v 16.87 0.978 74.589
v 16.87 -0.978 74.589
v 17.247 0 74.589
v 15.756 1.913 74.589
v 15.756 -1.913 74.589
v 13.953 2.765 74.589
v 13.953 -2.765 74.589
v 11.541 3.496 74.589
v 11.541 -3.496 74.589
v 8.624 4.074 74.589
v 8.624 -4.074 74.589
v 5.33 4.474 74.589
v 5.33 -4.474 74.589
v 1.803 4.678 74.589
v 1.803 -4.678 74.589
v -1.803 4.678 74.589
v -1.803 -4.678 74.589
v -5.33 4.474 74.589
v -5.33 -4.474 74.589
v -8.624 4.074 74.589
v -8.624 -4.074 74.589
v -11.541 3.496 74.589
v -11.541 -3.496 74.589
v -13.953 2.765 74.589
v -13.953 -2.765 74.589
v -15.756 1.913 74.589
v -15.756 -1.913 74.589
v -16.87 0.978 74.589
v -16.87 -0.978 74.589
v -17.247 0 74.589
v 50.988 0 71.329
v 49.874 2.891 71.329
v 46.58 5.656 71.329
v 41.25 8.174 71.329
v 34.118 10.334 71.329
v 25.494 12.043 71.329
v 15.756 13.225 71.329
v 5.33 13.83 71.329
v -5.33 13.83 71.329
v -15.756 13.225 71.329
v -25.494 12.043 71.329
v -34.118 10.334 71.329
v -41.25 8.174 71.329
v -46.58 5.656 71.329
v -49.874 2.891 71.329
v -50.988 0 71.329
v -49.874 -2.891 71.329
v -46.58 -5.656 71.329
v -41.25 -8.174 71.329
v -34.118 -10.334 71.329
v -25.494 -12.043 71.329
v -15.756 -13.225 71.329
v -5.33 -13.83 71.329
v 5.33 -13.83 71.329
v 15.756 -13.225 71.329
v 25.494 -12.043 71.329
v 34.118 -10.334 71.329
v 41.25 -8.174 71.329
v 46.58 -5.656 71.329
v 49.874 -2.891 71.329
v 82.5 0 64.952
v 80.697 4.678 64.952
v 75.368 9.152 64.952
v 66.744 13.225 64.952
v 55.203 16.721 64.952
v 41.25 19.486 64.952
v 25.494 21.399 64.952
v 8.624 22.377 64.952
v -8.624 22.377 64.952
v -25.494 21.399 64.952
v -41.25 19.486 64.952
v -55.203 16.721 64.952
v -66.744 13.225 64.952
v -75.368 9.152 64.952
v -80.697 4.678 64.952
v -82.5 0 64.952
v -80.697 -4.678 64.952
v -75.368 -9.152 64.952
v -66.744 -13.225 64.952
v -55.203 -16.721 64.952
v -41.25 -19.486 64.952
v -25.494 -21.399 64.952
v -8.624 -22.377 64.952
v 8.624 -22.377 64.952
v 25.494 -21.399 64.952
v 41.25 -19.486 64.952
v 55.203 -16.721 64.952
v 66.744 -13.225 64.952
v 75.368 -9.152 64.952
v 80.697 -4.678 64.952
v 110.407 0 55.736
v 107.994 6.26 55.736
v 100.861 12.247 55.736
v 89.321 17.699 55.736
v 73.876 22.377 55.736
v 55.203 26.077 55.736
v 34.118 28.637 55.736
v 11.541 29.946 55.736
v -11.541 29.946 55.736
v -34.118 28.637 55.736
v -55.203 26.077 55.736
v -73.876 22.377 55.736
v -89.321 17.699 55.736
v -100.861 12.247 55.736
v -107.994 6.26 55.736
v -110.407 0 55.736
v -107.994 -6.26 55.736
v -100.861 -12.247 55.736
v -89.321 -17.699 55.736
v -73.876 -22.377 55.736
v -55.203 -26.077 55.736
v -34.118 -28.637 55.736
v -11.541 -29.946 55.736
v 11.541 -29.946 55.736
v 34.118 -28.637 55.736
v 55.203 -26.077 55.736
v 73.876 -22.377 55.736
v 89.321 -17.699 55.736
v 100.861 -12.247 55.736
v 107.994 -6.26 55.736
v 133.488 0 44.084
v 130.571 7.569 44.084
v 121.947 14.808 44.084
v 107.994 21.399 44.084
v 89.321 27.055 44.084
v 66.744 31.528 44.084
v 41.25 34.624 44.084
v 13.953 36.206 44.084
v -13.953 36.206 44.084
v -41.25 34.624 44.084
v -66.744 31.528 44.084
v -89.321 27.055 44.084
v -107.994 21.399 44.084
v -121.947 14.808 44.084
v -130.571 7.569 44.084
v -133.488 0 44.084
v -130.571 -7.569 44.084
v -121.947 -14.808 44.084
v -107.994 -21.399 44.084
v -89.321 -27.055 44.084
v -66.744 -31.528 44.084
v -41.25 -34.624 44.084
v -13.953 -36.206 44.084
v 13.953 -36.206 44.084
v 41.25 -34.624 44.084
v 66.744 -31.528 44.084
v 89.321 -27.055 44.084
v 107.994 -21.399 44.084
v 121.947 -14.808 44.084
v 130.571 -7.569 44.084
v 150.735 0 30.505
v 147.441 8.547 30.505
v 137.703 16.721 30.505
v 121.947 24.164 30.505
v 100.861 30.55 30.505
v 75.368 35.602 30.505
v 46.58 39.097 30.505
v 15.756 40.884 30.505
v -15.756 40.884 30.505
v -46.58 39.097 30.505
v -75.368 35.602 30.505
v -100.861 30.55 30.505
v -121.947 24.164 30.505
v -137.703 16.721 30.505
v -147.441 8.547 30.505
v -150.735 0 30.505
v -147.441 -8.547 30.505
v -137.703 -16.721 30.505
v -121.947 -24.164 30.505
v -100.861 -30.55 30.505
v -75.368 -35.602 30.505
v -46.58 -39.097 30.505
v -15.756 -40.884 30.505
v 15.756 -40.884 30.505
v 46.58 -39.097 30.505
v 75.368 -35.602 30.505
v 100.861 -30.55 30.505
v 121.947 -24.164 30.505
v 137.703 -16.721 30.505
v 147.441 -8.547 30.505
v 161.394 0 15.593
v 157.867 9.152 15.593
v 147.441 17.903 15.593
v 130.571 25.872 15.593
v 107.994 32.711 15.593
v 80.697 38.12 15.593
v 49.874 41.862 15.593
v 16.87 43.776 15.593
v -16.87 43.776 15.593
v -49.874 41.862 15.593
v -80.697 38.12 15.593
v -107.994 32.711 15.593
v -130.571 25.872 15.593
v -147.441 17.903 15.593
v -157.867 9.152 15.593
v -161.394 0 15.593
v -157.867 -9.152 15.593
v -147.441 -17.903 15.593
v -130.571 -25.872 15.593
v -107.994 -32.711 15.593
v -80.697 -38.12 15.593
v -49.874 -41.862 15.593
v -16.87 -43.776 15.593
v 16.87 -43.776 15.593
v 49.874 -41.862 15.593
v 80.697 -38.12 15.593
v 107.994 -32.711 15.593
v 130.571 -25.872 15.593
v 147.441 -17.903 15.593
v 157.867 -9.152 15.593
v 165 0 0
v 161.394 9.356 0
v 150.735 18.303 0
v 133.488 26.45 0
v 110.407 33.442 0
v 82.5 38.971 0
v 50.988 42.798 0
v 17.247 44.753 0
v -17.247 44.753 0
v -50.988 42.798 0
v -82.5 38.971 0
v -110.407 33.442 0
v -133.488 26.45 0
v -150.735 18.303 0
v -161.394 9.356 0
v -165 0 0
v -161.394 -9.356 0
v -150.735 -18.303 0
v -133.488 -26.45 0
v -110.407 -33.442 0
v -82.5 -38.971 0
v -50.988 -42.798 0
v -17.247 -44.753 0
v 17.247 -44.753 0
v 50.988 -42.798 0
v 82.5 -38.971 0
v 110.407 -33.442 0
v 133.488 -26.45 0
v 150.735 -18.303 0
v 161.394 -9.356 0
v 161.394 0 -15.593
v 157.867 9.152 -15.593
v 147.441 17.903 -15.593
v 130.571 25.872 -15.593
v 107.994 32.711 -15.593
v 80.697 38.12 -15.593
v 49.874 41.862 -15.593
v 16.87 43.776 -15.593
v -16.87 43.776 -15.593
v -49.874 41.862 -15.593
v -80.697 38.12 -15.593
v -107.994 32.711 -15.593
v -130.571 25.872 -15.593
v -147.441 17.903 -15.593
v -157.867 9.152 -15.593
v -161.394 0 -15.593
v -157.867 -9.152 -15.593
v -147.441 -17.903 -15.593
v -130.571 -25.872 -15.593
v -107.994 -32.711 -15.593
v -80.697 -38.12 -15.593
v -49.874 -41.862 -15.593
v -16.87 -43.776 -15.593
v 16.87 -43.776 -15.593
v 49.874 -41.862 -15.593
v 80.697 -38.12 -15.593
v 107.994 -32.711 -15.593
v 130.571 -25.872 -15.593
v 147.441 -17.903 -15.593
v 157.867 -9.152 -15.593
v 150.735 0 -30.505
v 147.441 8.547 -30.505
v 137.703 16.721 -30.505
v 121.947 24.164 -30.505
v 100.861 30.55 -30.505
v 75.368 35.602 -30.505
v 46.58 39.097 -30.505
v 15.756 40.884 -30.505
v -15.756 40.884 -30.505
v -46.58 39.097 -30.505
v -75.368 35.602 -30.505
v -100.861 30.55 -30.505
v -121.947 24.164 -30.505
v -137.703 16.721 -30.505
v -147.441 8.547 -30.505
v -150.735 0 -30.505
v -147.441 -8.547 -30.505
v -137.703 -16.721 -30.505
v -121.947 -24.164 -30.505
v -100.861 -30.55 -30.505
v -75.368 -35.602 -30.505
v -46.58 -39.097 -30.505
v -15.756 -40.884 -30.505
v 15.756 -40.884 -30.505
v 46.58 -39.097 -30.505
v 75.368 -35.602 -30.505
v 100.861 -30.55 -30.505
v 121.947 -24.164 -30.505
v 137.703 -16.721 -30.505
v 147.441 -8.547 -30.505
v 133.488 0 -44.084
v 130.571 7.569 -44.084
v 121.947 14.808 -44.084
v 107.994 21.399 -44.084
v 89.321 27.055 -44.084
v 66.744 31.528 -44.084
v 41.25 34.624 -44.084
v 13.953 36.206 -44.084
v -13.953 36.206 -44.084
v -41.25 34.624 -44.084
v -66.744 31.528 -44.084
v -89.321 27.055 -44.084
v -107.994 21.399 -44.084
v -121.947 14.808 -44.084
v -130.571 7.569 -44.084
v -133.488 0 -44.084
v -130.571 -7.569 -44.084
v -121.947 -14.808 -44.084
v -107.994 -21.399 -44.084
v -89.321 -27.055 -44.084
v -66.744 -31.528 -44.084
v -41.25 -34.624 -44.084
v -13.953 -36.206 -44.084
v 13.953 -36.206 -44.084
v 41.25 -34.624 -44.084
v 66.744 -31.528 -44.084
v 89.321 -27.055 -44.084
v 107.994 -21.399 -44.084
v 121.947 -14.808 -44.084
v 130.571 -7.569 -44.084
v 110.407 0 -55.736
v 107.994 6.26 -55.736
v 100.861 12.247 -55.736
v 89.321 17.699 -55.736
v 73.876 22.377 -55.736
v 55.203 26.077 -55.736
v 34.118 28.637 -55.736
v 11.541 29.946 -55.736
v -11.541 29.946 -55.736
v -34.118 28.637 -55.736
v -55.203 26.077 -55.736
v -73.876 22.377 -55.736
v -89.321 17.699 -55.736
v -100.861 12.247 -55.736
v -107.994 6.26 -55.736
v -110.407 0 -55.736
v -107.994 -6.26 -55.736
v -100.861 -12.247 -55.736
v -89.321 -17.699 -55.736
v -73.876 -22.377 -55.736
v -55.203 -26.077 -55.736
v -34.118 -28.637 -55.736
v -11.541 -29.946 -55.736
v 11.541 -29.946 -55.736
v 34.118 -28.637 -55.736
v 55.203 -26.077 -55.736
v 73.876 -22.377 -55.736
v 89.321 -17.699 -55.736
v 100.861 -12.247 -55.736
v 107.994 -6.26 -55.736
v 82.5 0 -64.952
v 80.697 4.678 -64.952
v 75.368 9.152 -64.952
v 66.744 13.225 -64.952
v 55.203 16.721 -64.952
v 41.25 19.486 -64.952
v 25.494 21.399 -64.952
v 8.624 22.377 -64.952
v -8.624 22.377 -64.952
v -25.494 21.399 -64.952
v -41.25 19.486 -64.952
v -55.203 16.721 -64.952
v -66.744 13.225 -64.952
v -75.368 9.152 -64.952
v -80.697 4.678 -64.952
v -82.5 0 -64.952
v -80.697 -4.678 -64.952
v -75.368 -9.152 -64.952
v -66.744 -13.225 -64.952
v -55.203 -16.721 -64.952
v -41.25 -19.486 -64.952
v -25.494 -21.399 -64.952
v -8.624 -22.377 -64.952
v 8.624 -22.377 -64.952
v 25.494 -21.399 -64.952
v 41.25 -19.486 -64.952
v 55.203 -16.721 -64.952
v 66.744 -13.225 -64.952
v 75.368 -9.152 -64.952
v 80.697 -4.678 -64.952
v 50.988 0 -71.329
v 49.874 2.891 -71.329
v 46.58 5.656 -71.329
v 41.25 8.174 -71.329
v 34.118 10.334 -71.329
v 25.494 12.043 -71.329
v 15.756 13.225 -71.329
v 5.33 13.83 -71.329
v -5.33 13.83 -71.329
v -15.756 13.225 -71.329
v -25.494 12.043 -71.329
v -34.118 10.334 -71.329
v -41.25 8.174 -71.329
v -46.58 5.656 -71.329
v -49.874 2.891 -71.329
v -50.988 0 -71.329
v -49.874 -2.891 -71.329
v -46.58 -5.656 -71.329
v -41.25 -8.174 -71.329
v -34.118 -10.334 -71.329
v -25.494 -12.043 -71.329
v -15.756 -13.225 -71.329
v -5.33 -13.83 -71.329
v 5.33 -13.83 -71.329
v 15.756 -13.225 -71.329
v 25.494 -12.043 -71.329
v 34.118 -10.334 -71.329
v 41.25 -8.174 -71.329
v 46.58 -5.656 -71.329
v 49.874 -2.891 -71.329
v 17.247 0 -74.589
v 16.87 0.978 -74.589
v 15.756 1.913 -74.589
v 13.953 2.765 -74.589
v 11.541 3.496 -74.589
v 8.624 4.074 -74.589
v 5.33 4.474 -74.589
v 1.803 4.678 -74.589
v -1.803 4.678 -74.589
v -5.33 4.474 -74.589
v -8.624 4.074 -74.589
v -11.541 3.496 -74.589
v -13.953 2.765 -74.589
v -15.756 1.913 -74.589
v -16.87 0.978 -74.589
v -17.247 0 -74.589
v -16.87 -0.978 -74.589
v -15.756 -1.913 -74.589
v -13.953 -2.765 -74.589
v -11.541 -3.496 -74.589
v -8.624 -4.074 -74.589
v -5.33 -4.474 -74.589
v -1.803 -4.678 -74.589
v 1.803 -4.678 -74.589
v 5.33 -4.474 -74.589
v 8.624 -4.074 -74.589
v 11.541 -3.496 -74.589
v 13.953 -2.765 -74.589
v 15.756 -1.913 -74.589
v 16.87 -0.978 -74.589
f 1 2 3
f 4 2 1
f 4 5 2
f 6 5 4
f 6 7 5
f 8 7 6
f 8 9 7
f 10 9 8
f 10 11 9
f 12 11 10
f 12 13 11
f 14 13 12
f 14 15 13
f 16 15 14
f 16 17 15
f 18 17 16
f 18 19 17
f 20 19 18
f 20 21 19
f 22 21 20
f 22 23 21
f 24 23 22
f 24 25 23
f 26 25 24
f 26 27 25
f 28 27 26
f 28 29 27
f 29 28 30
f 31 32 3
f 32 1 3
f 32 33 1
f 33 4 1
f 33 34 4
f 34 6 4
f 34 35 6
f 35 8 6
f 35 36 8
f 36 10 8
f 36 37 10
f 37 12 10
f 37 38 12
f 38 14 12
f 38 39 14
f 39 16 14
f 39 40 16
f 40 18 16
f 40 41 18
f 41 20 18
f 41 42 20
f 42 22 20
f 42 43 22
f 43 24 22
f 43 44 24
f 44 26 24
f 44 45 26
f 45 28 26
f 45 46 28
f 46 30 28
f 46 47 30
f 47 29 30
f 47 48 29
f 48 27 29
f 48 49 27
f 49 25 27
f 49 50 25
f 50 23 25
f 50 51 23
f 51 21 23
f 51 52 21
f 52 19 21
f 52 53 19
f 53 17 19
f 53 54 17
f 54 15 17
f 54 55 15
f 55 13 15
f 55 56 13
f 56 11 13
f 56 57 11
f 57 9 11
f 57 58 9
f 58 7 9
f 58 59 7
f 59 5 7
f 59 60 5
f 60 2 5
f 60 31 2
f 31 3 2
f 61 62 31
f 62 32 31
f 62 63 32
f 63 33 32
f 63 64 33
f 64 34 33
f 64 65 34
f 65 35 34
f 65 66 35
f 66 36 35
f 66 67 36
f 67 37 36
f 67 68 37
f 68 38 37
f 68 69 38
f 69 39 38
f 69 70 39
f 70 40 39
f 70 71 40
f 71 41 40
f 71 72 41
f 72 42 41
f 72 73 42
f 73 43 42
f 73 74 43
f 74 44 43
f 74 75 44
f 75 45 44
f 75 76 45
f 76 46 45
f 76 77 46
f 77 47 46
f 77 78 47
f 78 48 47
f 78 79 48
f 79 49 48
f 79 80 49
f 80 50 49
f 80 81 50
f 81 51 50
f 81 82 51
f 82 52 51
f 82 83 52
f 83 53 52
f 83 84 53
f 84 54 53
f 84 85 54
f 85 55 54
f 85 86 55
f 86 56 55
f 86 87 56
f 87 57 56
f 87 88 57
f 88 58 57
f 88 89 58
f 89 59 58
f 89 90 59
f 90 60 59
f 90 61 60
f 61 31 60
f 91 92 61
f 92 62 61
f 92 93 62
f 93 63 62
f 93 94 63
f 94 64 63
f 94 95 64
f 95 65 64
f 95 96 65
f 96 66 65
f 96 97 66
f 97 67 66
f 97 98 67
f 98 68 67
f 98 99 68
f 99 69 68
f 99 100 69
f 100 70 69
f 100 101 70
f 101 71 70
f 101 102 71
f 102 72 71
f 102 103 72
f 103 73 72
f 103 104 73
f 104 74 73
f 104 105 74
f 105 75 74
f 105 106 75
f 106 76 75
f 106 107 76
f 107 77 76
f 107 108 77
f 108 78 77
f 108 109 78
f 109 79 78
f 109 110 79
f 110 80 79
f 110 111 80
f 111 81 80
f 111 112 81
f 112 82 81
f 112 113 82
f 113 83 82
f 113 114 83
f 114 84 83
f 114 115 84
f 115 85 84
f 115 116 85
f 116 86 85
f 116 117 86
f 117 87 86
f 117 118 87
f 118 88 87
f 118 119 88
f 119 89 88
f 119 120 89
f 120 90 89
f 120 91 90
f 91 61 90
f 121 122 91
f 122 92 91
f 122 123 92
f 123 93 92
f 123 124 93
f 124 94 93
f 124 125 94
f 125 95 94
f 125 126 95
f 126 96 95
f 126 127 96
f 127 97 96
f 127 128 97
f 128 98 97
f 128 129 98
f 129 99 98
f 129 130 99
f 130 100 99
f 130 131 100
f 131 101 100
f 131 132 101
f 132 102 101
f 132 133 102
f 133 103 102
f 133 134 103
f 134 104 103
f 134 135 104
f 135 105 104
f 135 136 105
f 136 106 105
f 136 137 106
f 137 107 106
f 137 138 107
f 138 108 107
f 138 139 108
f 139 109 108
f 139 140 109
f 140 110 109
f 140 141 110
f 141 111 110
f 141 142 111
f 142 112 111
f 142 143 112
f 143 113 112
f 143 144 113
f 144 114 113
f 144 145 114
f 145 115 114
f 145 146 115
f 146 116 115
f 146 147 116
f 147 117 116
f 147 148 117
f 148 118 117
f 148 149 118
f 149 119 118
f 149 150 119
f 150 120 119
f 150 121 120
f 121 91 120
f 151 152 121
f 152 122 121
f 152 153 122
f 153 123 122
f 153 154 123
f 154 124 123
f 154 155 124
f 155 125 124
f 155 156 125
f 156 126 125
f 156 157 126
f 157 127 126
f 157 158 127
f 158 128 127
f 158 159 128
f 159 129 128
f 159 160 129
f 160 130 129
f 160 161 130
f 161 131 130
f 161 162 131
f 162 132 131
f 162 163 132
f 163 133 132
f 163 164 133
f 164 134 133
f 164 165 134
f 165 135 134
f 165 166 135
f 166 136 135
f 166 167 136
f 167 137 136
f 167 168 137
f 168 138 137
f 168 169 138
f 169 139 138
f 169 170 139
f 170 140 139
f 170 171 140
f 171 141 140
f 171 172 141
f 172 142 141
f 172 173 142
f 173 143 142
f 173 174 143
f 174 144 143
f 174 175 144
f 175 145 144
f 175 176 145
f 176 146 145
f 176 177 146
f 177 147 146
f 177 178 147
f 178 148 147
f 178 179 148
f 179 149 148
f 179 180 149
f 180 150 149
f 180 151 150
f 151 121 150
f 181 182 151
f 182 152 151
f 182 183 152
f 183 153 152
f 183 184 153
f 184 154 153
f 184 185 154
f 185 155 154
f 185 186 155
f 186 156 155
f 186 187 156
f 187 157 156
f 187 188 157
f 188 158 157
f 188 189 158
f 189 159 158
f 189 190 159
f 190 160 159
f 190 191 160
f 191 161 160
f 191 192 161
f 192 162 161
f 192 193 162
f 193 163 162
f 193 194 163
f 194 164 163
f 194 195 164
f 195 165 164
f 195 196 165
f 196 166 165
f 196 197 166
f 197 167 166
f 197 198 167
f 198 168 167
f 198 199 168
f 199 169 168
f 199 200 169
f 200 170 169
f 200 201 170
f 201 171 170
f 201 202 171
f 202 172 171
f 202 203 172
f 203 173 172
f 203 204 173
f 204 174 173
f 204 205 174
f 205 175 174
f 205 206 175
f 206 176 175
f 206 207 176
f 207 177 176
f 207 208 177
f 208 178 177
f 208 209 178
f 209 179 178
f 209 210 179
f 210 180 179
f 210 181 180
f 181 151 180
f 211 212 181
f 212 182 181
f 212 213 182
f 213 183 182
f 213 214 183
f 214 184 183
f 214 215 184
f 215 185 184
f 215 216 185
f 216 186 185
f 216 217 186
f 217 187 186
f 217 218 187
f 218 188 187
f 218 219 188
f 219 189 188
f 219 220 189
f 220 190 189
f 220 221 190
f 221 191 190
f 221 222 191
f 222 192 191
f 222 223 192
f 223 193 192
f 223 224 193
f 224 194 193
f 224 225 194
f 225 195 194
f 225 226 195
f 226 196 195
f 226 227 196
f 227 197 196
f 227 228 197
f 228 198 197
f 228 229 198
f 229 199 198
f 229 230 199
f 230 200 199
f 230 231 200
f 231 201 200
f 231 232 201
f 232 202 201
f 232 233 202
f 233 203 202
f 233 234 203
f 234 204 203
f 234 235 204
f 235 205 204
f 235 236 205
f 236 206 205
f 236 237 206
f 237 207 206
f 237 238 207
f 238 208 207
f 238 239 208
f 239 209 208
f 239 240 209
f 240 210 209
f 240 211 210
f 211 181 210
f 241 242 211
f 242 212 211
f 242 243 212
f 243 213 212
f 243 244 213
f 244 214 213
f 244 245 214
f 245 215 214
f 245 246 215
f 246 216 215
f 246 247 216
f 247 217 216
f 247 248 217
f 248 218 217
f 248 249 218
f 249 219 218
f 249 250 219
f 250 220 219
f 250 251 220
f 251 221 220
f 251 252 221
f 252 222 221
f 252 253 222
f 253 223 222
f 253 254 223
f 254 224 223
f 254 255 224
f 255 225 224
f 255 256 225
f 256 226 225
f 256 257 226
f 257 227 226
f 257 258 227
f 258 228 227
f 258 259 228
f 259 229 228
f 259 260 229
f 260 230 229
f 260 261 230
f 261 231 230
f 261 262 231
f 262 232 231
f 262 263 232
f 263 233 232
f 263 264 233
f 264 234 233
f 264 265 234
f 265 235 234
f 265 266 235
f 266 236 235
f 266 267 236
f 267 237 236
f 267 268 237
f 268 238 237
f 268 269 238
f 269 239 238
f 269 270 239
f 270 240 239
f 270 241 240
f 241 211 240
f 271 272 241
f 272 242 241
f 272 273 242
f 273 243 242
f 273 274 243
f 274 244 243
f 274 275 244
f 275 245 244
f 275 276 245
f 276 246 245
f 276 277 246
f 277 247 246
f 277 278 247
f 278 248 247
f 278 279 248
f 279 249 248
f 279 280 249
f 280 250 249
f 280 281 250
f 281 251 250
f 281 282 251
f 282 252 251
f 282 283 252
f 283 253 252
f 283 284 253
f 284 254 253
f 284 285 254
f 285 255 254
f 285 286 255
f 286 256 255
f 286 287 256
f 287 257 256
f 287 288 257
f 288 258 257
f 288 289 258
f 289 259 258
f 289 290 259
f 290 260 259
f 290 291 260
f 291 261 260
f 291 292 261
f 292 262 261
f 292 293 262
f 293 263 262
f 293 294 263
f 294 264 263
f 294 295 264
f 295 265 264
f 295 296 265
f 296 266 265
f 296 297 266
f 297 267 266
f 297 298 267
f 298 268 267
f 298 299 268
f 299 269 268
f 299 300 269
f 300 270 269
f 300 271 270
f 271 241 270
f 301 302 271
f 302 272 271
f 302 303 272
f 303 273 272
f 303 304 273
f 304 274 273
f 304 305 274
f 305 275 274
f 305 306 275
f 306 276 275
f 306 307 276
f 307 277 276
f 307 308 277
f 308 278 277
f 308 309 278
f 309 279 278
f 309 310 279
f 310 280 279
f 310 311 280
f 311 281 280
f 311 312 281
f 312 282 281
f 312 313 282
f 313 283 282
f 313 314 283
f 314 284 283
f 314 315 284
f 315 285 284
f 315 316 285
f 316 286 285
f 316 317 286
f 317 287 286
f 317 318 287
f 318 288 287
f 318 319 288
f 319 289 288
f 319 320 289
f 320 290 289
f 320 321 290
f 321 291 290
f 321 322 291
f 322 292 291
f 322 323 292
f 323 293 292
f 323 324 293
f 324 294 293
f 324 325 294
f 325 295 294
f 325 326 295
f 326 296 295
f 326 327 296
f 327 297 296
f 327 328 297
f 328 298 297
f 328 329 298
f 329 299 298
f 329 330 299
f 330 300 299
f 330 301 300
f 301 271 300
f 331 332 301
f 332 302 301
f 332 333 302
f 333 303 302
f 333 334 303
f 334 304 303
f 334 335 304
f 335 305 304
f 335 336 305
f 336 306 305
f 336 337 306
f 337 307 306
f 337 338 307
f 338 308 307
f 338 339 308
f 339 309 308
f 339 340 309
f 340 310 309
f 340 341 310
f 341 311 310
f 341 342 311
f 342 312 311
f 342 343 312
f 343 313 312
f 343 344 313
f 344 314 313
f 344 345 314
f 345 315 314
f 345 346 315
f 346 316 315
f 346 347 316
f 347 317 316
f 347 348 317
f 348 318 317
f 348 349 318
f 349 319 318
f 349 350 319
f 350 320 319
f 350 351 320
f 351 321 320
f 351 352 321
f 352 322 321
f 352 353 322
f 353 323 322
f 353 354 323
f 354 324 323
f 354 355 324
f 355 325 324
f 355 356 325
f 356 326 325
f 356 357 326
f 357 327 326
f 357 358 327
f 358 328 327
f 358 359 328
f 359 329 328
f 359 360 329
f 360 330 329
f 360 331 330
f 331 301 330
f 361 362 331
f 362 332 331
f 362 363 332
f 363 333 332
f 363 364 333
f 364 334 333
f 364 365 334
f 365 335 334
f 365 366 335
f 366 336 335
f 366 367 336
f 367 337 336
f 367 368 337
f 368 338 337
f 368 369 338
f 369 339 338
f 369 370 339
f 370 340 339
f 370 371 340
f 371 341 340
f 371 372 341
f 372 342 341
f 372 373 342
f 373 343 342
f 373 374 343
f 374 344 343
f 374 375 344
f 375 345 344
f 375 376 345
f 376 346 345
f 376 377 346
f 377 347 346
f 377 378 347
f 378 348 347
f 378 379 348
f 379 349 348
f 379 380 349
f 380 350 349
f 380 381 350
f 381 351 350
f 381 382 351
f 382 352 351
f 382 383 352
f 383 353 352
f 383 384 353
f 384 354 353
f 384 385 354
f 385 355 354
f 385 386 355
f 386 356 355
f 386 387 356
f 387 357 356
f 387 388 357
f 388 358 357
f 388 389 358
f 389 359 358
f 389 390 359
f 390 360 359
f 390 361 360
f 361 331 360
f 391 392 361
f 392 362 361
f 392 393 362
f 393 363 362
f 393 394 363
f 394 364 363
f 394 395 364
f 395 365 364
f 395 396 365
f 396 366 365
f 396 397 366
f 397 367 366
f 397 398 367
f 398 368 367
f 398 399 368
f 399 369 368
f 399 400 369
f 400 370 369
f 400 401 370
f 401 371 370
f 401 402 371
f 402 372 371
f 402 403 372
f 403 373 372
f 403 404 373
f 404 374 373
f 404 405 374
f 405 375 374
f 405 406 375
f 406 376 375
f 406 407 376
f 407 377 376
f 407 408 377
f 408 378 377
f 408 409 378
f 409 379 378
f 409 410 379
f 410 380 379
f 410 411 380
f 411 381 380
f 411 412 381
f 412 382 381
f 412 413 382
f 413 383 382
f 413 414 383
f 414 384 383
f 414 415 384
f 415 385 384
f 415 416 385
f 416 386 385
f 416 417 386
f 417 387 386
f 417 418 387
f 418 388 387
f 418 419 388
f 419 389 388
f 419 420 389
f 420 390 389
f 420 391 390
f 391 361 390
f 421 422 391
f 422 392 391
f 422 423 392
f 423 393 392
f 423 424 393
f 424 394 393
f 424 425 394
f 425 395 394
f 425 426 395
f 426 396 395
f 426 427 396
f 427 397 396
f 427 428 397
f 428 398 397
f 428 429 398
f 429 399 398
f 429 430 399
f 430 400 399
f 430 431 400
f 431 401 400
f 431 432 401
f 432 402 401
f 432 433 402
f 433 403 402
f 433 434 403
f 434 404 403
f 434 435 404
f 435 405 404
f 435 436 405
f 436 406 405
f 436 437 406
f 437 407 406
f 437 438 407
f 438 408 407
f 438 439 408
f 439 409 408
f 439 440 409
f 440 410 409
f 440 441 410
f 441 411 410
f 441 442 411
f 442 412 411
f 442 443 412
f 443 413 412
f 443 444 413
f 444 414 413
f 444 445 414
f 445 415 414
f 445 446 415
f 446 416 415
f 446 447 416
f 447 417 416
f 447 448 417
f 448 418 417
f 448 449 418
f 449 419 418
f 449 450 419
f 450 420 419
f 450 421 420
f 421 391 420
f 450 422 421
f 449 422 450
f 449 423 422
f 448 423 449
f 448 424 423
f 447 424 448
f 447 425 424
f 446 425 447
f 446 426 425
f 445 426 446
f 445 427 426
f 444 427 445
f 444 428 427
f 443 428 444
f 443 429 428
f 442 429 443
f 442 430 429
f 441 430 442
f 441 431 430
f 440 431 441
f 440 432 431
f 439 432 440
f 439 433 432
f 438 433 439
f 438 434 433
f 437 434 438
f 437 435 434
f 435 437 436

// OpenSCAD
// Generated by SolidPython 1.0.1 on 2020-07-29 00:46:49


scale(v = [11, 3, 5]) {
	sphere(r = 15);
}
/***********************************************
*********      SolidPython code:      **********
************************************************
 
# import packages: SolidPython
from solid import *
from solid.utils import *
from itertools import chain, combinations, permutations


class Resize:

    def __init__(self, scad_file):
        self.scad_file = scad_file
        #self.scad_file = import_scad(scad_file)
        # cone/cylinder param:
        self.r1 = 0
        self.r2 = 0
        self.h = 0
        # rectangular prism param:
        self.w = 0
        self.l = 0
        # ellipse param:
        self.r = 0

    # import OpenScad code (file name corresponds to shape)


    # classify shape + parameters
    def assign(self, param1, param2, param3):
        if self.scad_file == 'cone.scad':
            self.r1 = param1
            self.r2 = param2
            self.h = param3
        elif self.scad_file == 'cylinder.scad':
            self.r1 = param1
            self.r2 = param2
            self.h = param3
        elif self.scad_file == 'rectangularPrism.scad':
            self.h = param1
            self.l = param2
            self.w = param3
        else:
            self.r = param1
            self.h = param2

    # resize parameters
    def iterate(self):
        x = range(3, 20, 2)
        i = 1
        if self.scad_file == 'cone.scad':
            tempList = list(permutations(x, 2))
            for temp in tempList:
                param1 = temp[0]
                param2 = temp[1]
                filepath = 'produced_scad_files/' + 'cone' + str(param1) + '_' + str(param2) + '_' + '.scad'
                scad_render_to_file(cylinder(h=param1, r1=param2, r2=0), filepath)

        elif self.scad_file == 'cylinder.scad':
            tempList = list(permutations(x, 3))
            for temp in tempList:
                param1 = temp[0]
                param2 = temp[1]
                filepath = 'produced_scad_files/' + 'cylinder' + str(param1) + '_' + str(param2) + '_' + '.scad'
                scad_render_to_file(cylinder(h=param1, r1=param2, r2=param2), filepath)

        elif self.scad_file == 'rectangularPrism.scad':
            tempList = list(permutations(x, 3))
            for temp in tempList:
                param1 = temp[0]
                param2 = temp[1]
                param3 = temp[2]
                filepath = 'produced_scad_files/' + 'rectangularPrism' + str(param1) + '_' + str(param2) + '_' + str(
                    param3) + '.scad'
                scad_render_to_file(cube(size=(param1, param2, param3)), filepath)

        elif self.scad_file == 'ellipse.scad':
            tempList = list(permutations(x, 4))
            for temp in tempList:
                param1 = temp[0]
                param2 = temp[1]
                param3 = temp[2]
                param4 = temp[3]
                filepath = 'produced_scad_files/' + 'ellipse' + str(param1) + '_' + str(param2) + '_' + str(param3) + '_' + str(param4) + '.scad'
                scad_render_to_file(scale([param1, param2, param3])(sphere(r=param4)), filepath)

    def render_to_scadfile(self):
        scad_render_to_file(scad, 'example.scad') 
 
************************************************/
